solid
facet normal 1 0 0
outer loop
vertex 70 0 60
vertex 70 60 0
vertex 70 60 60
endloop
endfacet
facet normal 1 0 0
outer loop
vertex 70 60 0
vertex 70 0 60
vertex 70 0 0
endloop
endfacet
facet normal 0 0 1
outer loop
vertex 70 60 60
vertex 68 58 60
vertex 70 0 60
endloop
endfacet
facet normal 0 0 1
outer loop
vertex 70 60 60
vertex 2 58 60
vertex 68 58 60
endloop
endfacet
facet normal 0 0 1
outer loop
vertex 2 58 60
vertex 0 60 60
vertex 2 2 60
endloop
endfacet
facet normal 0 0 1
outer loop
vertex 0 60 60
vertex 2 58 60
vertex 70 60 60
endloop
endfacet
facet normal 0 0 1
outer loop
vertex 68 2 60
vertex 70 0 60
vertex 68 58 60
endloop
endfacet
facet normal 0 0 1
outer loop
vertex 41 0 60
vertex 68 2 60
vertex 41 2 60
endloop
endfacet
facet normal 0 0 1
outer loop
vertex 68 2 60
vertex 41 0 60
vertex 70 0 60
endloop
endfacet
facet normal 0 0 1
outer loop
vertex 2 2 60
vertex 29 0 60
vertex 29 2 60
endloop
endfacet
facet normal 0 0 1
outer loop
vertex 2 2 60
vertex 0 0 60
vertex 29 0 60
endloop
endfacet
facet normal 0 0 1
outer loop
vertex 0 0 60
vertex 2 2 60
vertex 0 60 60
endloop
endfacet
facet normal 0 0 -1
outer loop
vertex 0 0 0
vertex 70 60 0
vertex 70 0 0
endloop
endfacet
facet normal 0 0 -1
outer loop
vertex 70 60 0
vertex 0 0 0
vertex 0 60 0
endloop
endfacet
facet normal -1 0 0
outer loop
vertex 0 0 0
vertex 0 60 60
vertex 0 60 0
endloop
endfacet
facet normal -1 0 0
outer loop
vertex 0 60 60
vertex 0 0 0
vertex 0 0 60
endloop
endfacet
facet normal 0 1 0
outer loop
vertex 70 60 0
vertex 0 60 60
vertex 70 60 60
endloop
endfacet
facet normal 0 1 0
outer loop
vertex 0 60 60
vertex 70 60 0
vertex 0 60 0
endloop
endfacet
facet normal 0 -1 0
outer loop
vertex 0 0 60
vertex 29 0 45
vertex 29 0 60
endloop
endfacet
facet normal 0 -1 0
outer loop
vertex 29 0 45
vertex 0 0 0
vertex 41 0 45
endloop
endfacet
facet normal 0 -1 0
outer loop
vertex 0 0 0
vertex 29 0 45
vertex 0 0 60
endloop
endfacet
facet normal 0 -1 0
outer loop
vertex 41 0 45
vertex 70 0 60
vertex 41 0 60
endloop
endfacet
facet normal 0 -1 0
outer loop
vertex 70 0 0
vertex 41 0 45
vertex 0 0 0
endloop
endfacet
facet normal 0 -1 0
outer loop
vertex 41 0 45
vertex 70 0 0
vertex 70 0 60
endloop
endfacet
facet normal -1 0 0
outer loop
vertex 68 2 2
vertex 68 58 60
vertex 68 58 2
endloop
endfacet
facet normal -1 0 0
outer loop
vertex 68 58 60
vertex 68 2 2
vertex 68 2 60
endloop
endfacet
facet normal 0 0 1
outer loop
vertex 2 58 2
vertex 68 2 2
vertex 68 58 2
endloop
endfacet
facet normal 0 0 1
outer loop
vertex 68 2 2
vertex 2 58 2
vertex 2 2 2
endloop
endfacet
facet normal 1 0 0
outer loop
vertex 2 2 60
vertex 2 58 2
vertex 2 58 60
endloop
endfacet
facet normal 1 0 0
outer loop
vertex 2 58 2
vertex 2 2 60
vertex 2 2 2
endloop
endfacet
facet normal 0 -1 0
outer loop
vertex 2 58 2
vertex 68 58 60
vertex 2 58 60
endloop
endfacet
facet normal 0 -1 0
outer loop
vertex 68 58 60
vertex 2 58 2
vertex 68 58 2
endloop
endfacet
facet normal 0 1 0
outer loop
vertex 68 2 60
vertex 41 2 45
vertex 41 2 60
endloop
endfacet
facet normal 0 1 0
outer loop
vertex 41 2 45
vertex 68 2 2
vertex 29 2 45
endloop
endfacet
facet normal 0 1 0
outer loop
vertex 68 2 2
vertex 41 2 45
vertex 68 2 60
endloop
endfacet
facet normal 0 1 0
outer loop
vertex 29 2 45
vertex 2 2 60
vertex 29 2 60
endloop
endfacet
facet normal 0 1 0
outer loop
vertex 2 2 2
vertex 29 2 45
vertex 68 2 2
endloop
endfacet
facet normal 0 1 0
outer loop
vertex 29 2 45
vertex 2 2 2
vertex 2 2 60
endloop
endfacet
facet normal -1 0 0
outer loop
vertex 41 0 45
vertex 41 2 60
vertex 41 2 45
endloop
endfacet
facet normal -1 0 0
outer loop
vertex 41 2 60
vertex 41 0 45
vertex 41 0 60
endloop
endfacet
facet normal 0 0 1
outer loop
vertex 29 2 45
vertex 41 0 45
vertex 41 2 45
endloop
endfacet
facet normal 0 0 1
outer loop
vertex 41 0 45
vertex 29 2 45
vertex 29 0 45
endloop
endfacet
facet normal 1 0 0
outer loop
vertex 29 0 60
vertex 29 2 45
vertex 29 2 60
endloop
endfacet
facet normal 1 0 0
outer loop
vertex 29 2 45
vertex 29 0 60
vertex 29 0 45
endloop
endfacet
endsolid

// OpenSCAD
$fn = 32;

// ----------------------------------------------------------------------
// Enclosure box: notch enclosure
// ----------------------------------------------------------------------

// --- parameters (mm) ---
box_l = 70;               // outer length, X
box_w = 60;               // outer width, Y
box_h = 60;               // outer height
wall_t = 2;               // wall thickness
notch_w = 12;             // cable notch width
notch_h = 15;             // cable notch height

inner_h = box_h - wall_t;  // cavity depth
boss_h = inner_h - 2;  // corner boss height

difference() {
  cube([box_l, box_w, box_h]);
  translate([wall_t, wall_t, wall_t])
    cube([box_l - 2 * wall_t, box_w - 2 * wall_t, box_h]);
  translate([box_l / 2 - notch_w / 2, -1, box_h - notch_h])
    cube([notch_w, wall_t + 2, notch_h + 1]);
}
